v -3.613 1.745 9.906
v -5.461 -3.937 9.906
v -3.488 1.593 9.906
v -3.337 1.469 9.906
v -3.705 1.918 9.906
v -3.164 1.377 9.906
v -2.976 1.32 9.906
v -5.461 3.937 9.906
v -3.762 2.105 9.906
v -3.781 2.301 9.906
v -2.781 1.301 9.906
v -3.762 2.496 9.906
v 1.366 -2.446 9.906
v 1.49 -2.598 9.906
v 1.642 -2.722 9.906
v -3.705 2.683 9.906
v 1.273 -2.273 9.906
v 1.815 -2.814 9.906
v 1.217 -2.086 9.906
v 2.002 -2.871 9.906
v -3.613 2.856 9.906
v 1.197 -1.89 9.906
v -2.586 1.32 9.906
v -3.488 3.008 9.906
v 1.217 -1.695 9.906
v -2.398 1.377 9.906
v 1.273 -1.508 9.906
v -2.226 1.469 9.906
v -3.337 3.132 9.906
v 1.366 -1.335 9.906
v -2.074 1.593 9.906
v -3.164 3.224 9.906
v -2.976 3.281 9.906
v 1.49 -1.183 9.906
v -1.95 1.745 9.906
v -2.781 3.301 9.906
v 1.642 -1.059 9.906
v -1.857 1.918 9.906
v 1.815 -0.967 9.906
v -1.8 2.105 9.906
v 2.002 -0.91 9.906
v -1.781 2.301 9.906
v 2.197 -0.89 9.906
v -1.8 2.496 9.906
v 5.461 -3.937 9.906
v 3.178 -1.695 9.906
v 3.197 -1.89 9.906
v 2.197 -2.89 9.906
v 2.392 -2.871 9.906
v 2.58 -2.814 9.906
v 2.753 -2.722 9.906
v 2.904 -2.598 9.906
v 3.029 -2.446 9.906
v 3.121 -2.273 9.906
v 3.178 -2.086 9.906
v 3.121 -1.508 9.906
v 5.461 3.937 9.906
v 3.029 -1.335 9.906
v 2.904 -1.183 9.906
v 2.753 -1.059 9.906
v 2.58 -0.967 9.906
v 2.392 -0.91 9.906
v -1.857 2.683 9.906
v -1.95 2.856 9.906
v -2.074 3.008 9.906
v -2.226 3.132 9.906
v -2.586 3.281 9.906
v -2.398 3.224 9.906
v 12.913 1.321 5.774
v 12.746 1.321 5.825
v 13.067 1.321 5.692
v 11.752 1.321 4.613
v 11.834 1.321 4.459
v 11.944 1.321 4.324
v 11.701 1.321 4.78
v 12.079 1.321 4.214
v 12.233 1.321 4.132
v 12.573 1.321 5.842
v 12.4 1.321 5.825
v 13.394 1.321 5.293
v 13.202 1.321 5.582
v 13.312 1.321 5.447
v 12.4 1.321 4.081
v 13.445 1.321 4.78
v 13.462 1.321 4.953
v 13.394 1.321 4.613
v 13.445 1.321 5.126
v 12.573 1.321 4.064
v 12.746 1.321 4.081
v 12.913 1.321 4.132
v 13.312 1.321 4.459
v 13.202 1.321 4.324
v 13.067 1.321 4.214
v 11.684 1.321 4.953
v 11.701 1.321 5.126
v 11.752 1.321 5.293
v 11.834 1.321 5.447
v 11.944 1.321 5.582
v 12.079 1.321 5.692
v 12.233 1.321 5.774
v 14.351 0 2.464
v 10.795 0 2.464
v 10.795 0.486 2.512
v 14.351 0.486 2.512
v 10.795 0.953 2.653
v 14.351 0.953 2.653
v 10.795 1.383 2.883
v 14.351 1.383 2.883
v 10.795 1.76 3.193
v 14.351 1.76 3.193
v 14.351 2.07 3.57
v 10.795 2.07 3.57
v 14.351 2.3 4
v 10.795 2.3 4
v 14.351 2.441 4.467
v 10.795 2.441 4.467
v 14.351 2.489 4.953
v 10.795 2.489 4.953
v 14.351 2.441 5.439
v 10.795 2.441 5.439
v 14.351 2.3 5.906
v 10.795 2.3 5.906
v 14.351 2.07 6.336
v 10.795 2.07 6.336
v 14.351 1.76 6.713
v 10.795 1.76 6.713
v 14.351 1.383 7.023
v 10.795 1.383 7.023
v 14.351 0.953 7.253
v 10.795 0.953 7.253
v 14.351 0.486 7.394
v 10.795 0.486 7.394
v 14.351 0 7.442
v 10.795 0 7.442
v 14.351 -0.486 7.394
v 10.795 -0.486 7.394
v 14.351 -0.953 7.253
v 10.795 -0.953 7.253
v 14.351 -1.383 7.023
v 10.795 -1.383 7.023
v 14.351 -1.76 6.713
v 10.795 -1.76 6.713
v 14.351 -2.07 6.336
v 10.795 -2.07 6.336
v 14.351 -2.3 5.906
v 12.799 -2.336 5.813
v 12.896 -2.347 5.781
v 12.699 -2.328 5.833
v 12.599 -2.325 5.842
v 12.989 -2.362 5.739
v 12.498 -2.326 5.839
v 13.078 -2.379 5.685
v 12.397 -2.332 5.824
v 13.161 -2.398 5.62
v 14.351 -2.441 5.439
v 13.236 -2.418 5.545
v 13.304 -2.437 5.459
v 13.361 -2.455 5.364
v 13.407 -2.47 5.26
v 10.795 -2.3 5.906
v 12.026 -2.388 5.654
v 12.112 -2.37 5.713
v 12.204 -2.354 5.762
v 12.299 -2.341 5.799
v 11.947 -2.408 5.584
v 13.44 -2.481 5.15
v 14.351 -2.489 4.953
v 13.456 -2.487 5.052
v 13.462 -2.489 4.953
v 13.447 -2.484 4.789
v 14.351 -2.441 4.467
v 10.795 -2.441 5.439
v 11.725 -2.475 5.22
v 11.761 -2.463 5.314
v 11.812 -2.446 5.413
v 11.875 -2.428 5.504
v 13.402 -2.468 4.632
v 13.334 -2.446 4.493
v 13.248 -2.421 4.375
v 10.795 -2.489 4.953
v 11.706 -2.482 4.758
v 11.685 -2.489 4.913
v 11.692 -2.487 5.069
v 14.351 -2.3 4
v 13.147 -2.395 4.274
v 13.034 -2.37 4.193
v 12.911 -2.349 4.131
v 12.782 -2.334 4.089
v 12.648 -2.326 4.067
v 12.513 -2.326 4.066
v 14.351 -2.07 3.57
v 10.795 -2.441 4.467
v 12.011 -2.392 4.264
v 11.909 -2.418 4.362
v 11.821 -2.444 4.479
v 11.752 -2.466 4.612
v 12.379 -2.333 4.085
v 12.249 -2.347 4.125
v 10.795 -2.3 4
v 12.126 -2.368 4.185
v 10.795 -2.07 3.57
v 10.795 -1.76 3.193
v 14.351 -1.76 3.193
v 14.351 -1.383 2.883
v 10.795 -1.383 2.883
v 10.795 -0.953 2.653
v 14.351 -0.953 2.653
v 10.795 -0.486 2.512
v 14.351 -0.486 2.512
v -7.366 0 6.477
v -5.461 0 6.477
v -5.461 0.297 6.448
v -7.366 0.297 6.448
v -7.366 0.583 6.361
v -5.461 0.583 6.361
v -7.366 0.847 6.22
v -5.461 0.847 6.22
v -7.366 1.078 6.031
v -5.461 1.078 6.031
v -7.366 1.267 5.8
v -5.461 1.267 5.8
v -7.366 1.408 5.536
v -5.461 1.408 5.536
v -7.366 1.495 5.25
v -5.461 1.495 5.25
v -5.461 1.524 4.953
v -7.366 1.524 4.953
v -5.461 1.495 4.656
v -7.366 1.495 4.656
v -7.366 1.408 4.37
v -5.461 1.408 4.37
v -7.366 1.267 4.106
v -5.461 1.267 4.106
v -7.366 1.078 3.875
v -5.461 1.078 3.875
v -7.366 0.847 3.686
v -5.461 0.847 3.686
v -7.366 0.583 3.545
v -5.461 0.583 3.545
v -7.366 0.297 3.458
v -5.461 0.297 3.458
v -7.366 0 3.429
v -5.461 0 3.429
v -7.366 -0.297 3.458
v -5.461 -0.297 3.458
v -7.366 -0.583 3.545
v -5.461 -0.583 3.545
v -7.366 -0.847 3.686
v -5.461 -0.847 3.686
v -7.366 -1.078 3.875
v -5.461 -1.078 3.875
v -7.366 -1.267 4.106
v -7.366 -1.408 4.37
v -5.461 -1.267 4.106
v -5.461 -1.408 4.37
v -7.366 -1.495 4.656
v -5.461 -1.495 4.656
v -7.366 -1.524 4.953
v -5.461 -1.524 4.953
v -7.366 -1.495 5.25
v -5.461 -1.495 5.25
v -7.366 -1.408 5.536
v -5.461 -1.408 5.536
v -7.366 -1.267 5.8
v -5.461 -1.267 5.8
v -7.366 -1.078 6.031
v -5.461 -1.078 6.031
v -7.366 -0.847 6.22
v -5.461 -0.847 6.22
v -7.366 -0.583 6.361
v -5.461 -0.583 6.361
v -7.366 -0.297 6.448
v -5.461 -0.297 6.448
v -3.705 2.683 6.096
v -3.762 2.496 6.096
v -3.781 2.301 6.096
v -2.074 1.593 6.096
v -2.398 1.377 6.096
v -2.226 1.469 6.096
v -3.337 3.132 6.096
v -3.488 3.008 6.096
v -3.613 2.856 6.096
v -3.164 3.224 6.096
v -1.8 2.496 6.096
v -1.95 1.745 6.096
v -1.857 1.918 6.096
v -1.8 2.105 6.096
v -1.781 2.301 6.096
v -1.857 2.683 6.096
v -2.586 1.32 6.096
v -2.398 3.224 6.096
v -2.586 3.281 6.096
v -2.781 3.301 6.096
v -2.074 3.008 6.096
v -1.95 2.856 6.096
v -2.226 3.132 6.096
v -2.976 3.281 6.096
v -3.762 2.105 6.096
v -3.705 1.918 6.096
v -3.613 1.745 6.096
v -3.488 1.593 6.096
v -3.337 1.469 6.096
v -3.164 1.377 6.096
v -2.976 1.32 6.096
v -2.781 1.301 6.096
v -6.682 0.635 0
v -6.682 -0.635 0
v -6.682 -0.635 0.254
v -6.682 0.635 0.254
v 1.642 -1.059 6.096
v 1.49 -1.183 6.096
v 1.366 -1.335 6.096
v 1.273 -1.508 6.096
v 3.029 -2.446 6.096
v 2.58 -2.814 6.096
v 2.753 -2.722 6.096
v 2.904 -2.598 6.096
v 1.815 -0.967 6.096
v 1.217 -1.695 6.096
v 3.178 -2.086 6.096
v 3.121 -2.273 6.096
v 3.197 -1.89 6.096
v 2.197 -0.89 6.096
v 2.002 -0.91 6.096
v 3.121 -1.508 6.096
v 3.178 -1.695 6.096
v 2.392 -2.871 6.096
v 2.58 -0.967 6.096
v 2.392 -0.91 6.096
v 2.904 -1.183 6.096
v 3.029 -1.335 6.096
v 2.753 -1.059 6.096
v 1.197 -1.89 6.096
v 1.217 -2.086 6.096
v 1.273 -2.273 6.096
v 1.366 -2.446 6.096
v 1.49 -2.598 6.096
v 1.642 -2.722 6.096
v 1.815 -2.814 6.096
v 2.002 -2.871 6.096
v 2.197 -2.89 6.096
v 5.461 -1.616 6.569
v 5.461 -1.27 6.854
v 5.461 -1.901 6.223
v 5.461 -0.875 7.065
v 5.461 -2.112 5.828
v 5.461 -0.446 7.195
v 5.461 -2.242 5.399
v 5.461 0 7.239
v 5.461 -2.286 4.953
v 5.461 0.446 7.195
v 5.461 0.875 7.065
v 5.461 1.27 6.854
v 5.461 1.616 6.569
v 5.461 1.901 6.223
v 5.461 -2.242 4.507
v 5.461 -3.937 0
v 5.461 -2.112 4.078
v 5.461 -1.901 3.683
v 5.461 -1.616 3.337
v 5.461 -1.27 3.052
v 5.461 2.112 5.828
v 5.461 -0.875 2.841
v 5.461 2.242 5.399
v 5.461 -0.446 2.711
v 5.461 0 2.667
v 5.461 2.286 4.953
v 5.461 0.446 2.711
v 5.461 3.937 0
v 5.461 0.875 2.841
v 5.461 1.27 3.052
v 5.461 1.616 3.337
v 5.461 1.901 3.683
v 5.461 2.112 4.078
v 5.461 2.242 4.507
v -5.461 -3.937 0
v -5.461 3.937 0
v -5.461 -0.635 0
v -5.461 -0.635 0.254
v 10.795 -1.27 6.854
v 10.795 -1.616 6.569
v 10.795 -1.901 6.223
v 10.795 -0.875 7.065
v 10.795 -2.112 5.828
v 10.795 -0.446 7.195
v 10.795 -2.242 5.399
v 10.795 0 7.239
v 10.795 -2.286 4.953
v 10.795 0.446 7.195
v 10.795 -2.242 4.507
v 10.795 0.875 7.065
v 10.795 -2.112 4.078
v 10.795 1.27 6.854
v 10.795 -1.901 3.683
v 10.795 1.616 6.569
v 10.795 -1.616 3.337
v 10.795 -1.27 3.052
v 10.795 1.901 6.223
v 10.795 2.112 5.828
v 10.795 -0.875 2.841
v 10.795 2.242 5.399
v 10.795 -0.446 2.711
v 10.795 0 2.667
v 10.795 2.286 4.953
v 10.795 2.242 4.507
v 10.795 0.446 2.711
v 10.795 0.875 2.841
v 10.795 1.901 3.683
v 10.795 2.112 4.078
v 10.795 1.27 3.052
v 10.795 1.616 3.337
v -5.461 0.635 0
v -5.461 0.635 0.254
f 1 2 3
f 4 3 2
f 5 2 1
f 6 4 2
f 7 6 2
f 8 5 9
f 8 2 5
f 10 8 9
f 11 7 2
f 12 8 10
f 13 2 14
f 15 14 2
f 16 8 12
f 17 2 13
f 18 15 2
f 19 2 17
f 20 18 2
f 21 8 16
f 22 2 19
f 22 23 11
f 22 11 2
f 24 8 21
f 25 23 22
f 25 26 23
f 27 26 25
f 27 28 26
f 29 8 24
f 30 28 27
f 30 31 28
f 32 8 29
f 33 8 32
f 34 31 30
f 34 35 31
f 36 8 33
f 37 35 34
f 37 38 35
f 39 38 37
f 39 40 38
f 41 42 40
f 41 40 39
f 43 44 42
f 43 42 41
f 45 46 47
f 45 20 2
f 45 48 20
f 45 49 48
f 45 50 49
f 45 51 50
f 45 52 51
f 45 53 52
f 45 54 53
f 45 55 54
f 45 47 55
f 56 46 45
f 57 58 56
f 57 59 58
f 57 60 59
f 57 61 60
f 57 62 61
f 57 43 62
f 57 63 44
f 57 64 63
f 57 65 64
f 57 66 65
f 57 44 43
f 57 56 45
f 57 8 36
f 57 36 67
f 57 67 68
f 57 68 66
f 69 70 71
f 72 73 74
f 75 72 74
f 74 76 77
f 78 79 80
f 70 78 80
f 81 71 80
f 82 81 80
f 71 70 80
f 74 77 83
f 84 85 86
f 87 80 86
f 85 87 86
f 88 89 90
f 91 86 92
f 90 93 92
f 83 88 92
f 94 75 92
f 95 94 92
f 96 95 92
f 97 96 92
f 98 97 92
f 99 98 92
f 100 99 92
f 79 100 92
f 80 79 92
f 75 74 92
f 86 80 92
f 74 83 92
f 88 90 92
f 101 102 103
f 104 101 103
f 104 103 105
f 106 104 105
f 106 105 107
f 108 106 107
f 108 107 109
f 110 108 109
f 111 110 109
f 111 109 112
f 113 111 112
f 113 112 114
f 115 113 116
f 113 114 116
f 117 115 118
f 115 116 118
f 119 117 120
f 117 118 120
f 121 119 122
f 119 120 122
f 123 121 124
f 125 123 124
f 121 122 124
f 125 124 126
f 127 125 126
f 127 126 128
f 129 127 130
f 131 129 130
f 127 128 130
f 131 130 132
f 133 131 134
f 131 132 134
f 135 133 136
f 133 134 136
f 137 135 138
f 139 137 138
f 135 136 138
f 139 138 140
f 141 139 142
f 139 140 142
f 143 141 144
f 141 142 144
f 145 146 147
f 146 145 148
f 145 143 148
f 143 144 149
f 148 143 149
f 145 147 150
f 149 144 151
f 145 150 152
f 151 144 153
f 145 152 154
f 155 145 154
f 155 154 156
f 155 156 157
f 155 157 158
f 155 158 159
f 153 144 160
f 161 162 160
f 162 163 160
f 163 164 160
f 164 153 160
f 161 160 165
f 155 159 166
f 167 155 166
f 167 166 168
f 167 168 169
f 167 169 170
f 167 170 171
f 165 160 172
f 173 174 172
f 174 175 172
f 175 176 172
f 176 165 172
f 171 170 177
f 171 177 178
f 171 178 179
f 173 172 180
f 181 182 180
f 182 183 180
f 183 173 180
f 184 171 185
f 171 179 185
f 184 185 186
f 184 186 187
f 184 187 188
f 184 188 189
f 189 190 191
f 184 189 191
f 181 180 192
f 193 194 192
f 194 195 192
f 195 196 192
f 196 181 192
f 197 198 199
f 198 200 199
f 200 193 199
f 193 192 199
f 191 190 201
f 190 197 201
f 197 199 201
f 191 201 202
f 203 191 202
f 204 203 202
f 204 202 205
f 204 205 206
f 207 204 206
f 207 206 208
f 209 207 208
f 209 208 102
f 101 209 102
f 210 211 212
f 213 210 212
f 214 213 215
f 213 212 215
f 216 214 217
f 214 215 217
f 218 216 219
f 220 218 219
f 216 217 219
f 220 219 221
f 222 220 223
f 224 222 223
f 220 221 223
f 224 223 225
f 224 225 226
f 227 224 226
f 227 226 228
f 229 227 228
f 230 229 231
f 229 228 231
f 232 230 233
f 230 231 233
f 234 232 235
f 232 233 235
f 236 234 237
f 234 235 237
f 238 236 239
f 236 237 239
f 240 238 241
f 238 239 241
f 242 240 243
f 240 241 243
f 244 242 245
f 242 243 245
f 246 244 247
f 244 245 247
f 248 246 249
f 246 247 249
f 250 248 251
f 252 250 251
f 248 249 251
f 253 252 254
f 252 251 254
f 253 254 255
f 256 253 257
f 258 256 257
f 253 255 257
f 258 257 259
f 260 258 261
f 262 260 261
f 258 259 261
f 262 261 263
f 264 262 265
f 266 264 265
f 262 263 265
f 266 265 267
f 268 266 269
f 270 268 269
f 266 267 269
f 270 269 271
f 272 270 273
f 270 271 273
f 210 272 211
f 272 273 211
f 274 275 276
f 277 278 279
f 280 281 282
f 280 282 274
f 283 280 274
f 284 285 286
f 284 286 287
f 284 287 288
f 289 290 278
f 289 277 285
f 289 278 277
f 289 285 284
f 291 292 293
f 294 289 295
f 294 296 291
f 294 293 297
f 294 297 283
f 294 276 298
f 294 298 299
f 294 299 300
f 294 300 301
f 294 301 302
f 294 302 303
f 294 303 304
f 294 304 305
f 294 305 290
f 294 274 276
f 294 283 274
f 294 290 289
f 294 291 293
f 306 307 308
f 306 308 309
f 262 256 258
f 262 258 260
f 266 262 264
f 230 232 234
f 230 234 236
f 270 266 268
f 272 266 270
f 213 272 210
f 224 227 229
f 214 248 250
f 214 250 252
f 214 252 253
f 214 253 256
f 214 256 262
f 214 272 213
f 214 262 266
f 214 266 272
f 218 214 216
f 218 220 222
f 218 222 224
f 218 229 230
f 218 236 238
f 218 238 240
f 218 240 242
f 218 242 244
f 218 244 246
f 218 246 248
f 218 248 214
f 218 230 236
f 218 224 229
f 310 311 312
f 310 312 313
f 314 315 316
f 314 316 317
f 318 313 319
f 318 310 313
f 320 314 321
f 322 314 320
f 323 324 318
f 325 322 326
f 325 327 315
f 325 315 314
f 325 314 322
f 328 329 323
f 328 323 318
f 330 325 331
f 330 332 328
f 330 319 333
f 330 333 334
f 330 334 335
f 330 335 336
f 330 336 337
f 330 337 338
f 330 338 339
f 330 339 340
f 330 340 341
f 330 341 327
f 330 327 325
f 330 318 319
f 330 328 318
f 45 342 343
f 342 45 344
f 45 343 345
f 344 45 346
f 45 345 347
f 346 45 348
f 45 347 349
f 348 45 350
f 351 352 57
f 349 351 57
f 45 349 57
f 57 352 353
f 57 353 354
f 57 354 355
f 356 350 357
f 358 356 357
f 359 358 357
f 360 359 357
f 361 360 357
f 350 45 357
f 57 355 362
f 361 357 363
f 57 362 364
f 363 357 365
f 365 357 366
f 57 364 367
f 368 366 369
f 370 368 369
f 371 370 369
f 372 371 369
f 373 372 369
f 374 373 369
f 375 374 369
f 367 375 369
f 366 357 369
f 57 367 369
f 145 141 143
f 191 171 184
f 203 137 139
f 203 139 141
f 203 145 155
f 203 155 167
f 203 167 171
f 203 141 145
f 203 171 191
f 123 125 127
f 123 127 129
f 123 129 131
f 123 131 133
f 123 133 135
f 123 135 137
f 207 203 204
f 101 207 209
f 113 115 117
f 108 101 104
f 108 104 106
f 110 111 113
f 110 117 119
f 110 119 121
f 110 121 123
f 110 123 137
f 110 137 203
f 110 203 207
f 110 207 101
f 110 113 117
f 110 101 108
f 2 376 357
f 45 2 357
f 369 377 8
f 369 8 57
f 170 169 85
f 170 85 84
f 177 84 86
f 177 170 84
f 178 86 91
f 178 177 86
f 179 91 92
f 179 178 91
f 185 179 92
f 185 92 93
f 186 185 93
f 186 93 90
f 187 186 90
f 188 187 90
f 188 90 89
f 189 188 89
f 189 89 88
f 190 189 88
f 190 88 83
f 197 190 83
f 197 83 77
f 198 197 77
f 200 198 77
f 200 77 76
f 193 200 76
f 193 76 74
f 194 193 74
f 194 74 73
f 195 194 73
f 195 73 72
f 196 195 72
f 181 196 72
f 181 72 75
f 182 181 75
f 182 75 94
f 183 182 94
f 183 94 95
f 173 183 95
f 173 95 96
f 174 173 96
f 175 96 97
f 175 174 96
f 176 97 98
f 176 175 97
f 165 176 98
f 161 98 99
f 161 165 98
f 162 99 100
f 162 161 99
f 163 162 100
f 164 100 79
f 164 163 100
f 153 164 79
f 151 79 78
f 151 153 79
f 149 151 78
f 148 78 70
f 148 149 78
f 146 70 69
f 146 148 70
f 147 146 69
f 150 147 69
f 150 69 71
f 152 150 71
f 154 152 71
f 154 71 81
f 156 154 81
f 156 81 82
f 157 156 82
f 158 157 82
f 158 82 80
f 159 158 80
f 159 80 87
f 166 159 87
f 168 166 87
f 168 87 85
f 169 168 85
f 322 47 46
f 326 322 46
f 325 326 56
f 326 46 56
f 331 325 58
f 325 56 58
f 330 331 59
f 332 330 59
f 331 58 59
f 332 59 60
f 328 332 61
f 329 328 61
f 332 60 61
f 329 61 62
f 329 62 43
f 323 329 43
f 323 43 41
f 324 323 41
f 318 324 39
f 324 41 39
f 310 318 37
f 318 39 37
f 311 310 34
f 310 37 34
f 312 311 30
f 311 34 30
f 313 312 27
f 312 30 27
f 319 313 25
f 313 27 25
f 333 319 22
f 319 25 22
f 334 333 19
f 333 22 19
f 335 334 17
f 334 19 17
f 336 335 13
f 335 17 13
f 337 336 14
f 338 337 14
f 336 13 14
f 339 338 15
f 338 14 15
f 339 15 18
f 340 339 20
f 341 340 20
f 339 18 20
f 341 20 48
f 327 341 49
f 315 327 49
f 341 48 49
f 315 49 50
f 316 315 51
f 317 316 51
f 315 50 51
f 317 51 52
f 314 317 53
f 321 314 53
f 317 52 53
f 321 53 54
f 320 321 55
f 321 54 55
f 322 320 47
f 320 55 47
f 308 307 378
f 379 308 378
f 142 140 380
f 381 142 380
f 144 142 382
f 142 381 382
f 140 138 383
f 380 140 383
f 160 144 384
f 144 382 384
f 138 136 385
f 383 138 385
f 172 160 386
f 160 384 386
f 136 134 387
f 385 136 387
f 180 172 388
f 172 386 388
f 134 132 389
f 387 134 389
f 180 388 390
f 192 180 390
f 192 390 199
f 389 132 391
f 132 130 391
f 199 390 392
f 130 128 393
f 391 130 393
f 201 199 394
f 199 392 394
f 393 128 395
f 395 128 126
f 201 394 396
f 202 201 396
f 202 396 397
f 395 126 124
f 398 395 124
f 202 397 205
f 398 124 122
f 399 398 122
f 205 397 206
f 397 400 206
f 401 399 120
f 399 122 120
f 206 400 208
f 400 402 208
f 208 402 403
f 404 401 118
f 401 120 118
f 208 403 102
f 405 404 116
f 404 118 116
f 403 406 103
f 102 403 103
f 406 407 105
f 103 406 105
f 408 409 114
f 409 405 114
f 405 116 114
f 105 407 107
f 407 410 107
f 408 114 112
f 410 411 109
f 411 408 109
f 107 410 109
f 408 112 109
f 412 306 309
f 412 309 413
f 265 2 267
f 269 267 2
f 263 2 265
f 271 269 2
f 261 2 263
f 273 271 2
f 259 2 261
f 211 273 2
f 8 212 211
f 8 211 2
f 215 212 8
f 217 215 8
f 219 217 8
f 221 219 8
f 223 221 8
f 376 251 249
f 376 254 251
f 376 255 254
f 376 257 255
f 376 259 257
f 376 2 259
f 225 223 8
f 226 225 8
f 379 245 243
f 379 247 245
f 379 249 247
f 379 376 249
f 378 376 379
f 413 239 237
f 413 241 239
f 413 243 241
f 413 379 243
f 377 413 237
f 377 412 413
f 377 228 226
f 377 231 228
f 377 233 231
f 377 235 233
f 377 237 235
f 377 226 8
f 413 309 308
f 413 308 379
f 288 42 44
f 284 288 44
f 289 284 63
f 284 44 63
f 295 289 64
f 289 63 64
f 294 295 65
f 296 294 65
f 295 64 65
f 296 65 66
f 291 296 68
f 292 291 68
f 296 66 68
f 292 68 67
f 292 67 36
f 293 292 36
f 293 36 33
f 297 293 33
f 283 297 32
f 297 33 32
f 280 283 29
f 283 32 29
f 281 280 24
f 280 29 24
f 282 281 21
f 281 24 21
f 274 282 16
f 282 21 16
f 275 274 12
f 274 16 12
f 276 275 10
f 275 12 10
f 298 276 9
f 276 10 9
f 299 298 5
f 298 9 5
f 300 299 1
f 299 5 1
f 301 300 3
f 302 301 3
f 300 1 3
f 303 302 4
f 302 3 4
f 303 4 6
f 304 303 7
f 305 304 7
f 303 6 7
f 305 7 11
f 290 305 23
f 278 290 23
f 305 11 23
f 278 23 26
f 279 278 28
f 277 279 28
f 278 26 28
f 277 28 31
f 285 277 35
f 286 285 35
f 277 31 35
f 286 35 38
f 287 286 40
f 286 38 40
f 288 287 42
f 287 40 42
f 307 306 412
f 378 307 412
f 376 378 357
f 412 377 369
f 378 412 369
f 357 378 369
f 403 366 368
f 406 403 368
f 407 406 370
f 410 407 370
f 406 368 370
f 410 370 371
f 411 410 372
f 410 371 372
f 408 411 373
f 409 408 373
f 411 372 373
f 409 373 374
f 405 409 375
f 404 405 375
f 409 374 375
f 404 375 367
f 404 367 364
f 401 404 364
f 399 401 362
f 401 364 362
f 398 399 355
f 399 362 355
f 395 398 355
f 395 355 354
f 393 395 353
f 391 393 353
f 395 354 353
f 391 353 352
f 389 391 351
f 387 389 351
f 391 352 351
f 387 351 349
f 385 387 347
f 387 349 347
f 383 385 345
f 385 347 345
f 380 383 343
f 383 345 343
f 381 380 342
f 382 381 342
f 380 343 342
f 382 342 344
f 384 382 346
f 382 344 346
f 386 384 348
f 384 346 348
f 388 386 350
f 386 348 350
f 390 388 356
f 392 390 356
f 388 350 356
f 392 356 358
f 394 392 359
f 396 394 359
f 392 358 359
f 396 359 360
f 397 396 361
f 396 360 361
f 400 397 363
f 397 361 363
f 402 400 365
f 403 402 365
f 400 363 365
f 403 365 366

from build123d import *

# Parameters (mm, degrees)
SKETCH1_W           = 10.922
SKETCH1_H           = 7.874
BOSS_EXTRUDE1_DEPTH = 9.906
SKETCH2_R           = 2.286
BOSS_EXTRUDE2_DEPTH = 5.334
SKETCH3_R           = 2.4892
BOSS_EXTRUDE3_DEPTH = 3.556
SKETCH4_R           = 1.524
BOSS_EXTRUDE4_DEPTH = 1.905
SKETCH5_R           = 1
CUT_EXTRUDE1_DEPTH  = 3.81
SKETCH7_R           = 0.889
CUT_EXTRUDE2_DEPTH  = 3.81
SKETCH8_W           = 1.221154325
SKETCH8_H           = 1.27
BOSS_EXTRUDE5_DEPTH = 0.254


with BuildPart() as part:
    # Sketch1 → Boss-Extrude1 (new body)
    with BuildSketch(Plane.XY):
        Rectangle(SKETCH1_W, SKETCH1_H)
    extrude(amount=BOSS_EXTRUDE1_DEPTH)

    # Sketch2 → Boss-Extrude2 (add)
    with BuildSketch(Plane(origin=(5.461, 0, 0), x_dir=(0, 0, -1), z_dir=(1, 0, 0))):
        with Locations((-4.953, 0)):
            Circle(SKETCH2_R)
    extrude(amount=BOSS_EXTRUDE2_DEPTH)

    # Sketch3 → Boss-Extrude3 (add)
    with BuildSketch(Plane(origin=(10.795, 0, 0), x_dir=(0, 0, -1), z_dir=(1, 0, 0))):
        with Locations((-4.953, 0)):
            Circle(SKETCH3_R)
    extrude(amount=BOSS_EXTRUDE3_DEPTH)

    # Sketch4 → Boss-Extrude4 (add)
    with BuildSketch(Plane.ZY.offset(5.461)):
        with Locations((4.953, 0)):
            Circle(SKETCH4_R)
    extrude(amount=BOSS_EXTRUDE4_DEPTH)

    # Sketch5 → Cut-Extrude1 (cut)
    with BuildSketch(Plane.XY.offset(9.906)):
        with Locations((2.197310811, -1.890493537)):
            Circle(SKETCH5_R)
        with Locations((-2.781089189, 2.300506463)):
            Circle(SKETCH5_R)
    extrude(amount=-CUT_EXTRUDE1_DEPTH, mode=Mode.SUBTRACT)

    # Sketch7 → Cut-Extrude2 (cut)
    with BuildSketch(Plane(origin=(0, -2.4892, 0), x_dir=(1, 0, 0), z_dir=(0, 1, 0))):
        with Locations((12.573, -4.953)):
            Circle(SKETCH7_R)
    extrude(amount=CUT_EXTRUDE2_DEPTH, mode=Mode.SUBTRACT)

    # Sketch8 → Boss-Extrude5 (add)
    with BuildSketch(Plane.XY):
        with Locations((-6.071577163, 0)):
            Rectangle(SKETCH8_W, SKETCH8_H)
    extrude(amount=BOSS_EXTRUDE5_DEPTH)


solid = part.part
